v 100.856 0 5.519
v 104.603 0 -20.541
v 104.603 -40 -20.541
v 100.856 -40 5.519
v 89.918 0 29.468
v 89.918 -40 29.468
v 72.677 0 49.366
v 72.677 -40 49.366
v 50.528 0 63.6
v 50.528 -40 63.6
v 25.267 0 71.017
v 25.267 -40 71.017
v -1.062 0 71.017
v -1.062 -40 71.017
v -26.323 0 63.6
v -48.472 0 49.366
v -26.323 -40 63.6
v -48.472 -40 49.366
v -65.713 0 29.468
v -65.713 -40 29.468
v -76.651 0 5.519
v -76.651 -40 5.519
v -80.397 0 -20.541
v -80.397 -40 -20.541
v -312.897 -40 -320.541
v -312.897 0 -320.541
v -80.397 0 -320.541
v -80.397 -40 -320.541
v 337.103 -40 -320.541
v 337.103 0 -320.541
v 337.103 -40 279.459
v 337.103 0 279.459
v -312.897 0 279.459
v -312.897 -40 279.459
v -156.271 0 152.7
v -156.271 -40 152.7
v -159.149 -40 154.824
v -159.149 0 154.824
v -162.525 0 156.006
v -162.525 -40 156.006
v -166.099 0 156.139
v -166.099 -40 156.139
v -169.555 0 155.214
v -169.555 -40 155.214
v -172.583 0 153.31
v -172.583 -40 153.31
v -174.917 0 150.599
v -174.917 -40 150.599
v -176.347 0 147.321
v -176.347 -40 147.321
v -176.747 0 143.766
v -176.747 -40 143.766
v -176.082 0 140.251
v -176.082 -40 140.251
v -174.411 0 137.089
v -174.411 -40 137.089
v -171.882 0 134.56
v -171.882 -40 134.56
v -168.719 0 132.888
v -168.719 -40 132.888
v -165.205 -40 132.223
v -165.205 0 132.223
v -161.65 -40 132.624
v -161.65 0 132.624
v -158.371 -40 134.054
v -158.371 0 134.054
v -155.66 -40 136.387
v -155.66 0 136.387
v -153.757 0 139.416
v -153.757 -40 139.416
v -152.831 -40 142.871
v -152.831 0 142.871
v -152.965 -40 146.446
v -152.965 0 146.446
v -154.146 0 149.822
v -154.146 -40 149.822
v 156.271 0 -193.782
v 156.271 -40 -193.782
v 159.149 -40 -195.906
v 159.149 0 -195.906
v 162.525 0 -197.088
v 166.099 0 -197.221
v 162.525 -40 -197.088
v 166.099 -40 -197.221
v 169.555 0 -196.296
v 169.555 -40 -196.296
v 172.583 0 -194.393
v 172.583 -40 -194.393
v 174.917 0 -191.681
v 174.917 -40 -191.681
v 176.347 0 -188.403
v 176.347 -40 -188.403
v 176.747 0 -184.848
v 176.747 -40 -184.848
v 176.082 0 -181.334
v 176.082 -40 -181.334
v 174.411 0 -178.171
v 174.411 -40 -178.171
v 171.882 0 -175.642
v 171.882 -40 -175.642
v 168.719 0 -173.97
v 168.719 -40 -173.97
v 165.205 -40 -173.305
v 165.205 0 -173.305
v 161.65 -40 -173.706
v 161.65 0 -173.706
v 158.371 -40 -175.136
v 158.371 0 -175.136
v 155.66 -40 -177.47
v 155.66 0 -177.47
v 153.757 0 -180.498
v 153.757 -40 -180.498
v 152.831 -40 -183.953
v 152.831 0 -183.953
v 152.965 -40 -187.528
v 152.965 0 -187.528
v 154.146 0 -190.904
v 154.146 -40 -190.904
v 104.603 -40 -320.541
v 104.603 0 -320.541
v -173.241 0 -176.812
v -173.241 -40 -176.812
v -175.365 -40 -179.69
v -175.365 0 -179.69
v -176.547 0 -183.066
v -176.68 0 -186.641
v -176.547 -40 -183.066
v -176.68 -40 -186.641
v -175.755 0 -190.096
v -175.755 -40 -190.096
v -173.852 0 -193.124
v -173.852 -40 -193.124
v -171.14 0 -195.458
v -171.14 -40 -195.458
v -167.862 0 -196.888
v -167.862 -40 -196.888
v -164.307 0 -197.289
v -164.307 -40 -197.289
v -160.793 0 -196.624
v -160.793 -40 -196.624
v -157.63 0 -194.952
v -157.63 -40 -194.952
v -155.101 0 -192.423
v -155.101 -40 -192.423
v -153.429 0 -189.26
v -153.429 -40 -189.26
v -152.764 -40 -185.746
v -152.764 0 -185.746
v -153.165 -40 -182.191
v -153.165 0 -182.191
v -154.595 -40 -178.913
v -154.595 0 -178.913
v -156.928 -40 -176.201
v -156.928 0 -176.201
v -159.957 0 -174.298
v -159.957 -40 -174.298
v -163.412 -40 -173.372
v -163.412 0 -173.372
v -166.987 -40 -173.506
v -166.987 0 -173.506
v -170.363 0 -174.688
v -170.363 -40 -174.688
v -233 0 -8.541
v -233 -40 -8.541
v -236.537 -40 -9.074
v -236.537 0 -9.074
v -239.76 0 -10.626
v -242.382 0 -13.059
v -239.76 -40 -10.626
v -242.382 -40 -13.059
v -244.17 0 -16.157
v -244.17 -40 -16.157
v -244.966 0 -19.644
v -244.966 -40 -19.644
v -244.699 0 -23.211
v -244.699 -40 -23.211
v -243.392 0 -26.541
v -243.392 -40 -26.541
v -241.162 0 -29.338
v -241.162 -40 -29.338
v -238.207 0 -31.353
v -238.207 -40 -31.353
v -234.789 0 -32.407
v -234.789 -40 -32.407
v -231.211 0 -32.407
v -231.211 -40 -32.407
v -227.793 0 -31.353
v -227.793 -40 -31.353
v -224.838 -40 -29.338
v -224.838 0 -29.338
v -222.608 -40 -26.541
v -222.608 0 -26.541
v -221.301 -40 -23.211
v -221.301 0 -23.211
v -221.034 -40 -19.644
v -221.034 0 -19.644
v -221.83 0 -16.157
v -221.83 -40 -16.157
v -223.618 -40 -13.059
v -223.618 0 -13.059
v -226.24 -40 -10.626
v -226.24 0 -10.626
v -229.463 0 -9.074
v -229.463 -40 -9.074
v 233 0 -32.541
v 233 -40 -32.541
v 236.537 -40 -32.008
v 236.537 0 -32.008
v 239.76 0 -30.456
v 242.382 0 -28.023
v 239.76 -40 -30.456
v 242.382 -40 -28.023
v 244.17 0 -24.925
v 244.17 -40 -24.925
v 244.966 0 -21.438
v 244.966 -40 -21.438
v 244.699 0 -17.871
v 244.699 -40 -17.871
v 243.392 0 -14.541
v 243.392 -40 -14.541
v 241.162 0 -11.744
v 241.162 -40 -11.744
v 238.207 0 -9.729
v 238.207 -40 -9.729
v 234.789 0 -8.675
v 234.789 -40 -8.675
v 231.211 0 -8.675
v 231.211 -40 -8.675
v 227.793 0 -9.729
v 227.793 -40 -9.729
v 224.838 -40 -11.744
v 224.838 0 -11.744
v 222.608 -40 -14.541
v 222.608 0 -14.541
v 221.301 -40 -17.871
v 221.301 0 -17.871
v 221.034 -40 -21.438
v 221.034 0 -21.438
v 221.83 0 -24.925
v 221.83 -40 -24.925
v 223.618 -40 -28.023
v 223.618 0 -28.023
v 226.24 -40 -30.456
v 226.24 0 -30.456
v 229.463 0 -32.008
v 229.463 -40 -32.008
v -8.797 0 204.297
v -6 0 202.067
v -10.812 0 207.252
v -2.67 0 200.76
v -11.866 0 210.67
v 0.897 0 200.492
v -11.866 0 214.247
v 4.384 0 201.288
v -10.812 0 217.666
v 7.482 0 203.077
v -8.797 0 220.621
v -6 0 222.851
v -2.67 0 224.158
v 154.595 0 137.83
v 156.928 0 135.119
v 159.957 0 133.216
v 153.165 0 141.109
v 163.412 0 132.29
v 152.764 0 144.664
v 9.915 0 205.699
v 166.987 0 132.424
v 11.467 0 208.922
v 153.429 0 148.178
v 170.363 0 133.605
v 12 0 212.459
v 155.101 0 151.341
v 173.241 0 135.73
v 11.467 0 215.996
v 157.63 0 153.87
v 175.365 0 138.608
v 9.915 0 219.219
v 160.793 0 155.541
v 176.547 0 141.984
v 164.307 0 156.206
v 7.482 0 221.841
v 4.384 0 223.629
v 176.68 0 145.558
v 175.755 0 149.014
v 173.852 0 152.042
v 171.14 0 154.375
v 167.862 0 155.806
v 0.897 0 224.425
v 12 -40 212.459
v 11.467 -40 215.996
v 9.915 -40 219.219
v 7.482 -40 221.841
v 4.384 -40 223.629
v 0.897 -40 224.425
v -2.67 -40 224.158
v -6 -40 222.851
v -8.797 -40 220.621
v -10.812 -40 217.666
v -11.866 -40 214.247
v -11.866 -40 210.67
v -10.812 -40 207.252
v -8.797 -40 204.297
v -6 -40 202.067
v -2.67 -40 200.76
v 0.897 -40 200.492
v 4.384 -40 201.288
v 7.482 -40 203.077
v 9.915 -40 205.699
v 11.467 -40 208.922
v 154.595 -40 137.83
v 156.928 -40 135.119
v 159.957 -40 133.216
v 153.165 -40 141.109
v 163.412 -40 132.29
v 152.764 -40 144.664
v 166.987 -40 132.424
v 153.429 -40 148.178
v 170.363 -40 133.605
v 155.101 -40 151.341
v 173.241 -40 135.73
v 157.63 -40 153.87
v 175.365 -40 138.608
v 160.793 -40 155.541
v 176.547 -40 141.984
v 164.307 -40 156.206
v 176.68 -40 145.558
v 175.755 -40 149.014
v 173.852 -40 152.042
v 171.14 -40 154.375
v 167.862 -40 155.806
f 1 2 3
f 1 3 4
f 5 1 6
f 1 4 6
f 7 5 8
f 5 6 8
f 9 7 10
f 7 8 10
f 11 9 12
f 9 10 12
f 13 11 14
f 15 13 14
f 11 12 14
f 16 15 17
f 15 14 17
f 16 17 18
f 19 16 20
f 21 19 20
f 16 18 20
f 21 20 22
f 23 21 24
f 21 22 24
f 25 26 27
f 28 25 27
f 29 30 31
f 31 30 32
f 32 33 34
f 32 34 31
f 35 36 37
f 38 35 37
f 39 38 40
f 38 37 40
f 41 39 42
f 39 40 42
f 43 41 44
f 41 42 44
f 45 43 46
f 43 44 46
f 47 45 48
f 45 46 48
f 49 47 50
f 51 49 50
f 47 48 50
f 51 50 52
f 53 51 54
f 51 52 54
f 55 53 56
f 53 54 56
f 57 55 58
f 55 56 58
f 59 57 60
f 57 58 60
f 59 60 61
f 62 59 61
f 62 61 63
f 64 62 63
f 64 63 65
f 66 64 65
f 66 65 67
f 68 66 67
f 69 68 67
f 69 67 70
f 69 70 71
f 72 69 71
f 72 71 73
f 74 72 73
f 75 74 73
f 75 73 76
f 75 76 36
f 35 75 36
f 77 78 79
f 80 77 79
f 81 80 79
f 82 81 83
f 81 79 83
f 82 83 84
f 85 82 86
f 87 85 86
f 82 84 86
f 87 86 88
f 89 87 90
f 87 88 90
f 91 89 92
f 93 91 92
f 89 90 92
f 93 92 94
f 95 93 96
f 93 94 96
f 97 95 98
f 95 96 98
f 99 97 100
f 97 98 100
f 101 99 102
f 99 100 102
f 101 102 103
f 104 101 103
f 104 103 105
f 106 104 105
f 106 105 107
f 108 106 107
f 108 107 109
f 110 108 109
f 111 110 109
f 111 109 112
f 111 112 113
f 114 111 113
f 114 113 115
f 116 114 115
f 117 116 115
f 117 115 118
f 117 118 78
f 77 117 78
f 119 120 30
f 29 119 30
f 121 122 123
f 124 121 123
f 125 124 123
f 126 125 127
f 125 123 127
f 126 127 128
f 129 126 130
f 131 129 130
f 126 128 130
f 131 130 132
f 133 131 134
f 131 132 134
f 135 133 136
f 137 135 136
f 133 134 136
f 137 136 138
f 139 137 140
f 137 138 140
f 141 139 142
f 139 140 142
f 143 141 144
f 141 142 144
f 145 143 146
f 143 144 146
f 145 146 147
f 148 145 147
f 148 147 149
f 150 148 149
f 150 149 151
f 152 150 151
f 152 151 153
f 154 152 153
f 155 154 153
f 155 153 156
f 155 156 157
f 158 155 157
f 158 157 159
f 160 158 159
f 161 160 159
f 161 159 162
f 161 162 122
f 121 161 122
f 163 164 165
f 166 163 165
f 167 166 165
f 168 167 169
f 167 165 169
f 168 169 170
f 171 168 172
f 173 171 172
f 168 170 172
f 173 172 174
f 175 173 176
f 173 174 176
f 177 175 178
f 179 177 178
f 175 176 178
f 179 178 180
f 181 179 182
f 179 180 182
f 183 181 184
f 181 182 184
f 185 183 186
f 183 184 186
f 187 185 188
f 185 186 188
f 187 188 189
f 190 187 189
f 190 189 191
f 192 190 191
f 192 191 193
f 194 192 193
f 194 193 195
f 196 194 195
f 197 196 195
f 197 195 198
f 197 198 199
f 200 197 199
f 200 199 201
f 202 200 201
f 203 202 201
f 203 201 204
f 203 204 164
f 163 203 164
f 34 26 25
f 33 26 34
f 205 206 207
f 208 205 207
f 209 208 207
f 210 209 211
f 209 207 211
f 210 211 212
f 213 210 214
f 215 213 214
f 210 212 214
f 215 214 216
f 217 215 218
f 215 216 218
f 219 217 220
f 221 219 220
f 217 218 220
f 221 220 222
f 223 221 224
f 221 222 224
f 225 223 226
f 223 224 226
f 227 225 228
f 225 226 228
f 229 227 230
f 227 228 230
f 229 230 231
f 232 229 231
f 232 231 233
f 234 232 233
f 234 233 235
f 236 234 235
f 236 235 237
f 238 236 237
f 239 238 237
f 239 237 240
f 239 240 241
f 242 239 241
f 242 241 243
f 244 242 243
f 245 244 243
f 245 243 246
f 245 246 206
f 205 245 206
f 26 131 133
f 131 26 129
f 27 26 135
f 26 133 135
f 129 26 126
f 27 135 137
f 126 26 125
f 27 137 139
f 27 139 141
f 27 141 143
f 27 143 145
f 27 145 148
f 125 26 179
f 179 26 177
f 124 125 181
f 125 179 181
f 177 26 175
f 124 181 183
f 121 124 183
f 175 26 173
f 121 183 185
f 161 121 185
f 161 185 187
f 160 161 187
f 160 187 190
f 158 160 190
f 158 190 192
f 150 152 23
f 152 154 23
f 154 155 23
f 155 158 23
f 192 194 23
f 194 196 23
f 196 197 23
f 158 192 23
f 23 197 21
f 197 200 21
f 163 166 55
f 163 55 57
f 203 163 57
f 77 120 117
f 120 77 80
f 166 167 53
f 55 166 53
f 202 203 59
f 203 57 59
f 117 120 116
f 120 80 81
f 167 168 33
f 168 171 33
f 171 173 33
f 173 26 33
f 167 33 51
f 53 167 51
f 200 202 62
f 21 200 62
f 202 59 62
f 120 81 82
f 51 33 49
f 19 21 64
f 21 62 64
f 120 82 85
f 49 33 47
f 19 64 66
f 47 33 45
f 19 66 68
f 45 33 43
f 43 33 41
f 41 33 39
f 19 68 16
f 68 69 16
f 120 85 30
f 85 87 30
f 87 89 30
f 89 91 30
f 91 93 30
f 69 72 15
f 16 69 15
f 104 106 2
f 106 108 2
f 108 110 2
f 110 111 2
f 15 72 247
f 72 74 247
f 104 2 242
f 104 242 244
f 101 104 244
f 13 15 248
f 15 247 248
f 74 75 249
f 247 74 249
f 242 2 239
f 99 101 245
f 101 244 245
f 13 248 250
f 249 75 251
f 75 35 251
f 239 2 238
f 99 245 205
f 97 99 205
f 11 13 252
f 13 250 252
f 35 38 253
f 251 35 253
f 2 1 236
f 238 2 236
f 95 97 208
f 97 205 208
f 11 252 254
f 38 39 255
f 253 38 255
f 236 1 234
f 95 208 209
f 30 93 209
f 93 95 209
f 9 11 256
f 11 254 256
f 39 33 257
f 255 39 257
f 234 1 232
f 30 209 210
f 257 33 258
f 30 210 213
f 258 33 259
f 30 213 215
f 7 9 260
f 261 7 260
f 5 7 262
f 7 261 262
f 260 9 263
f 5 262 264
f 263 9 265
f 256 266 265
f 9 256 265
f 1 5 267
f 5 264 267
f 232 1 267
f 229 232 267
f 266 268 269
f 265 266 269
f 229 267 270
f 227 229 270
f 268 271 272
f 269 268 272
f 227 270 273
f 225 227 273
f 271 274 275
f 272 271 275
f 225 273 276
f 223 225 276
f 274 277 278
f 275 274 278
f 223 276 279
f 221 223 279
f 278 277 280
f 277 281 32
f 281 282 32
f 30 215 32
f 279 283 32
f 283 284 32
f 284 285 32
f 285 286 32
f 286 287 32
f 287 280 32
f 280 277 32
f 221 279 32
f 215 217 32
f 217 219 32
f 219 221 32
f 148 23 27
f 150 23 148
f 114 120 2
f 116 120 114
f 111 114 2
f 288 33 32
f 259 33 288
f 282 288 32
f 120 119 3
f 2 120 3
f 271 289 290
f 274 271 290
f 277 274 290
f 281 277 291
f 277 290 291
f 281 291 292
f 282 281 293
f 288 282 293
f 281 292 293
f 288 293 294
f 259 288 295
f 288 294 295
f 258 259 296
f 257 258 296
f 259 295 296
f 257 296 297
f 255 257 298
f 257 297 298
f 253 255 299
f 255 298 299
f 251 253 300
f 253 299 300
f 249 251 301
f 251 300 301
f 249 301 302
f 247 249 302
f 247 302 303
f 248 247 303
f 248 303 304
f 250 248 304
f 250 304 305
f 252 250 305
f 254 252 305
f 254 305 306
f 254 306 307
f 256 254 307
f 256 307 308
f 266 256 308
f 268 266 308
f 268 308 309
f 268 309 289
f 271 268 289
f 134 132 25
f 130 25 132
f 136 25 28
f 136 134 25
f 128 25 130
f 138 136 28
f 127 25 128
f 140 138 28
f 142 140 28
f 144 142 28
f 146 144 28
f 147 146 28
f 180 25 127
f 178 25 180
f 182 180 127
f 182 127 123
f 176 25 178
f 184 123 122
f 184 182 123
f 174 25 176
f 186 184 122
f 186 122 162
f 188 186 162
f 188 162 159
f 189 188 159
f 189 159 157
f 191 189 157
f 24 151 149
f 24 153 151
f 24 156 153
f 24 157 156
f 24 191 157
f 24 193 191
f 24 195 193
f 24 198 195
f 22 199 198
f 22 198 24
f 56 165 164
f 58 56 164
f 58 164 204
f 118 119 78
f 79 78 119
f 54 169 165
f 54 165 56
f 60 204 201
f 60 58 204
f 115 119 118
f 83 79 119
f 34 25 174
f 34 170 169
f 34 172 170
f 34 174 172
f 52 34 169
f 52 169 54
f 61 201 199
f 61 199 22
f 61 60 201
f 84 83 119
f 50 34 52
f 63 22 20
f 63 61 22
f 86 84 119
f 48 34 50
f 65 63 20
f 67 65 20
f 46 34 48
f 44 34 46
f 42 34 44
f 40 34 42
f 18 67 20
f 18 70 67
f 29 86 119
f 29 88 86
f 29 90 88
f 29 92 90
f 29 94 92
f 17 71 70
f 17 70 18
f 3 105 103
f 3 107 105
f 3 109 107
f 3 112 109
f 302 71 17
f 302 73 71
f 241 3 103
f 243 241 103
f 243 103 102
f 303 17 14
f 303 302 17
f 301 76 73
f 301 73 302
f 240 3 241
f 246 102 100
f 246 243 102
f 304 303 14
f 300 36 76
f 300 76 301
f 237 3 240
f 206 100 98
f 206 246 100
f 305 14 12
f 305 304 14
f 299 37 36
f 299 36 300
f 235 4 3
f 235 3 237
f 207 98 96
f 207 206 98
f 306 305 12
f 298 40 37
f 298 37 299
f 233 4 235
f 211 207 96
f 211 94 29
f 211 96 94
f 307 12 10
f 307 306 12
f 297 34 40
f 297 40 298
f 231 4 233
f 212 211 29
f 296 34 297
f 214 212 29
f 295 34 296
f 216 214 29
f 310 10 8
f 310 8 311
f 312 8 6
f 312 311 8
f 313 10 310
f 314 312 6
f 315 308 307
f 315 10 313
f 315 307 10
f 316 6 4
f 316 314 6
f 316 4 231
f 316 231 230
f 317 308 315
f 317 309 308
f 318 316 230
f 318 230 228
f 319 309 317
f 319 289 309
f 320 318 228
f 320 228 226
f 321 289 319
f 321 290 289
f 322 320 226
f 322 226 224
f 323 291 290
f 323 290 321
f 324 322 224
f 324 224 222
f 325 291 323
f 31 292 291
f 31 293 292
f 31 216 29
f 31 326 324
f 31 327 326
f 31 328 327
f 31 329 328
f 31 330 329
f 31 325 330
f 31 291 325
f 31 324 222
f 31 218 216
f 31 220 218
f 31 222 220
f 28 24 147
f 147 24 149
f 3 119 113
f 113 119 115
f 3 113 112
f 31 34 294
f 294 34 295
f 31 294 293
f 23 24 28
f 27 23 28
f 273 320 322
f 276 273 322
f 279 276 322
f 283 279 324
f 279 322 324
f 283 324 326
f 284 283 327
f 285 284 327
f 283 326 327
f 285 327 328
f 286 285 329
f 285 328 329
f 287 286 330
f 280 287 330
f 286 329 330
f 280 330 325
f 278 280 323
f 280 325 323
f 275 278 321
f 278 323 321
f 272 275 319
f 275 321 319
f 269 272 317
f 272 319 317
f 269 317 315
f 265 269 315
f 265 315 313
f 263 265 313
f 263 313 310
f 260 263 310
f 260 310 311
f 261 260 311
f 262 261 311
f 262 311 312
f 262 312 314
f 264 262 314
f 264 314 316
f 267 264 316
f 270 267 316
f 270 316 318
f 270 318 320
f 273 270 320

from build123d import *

# Parameters (mm, degrees)
F0_W             = 650
F0_H             = 600
F1_DEPTH         = 40
F3_DEPTH         = 40.001
F4_R             = 12
F5_DEPTH         = 40.001
F5_COPIES_COUNT  = 4
F5_COPIES_ANGLE  = 135
F5_COPIES1_COUNT = 4
F5_COPIES1_ANGLE = 135


# Not quite as in the source:
# - a pattern or mirror of a feature is missing from the dataset's text; its kind, count and spacing are read off the source's solid


with BuildPart() as f1:
    # F0 (on Front) → F1 (new body)
    with BuildSketch(Plane.XZ):
        with Locations((12.1025014669, -20.5410706814)):
            Rectangle(F0_W, F0_H)
    extrude(amount=F1_DEPTH)

    # F2 (on face) → F3 (cut, through all)
    with BuildSketch(Plane.XZ.offset(40)):
        with BuildLine():
            Line((-80.3974985331, -20.5410706814), (-80.3974985331, -320.5410706814))
            Line((-80.3974985331, -320.5410706814), (104.6025014669, -320.5410706814))
            Line((104.6025014669, -320.5410706814), (104.6025014669, -20.5410706814))
            ThreePointArc((104.6025014669, -20.5410706814), (12.1025014669, 71.9589293186), (-80.3974985331, -20.5410706814))
        make_face()
    extrude(amount=-F3_DEPTH, mode=Mode.SUBTRACT)

    # F4 (on face) → F5 (cut, through all)
    with BuildSketch(Plane.XZ.offset(40)):
        with Locations((0, 212.4589293186)):
            Circle(F4_R)
    f5 = extrude(amount=-F5_DEPTH, mode=Mode.SUBTRACT)

    # F5_copies: F5 ×4 about axis
    f5_copies_axis = Axis((0, 0, -20.541071), (0, 1, 0))
    for i in range(1, F5_COPIES_COUNT):
        add(f5.rotate(f5_copies_axis, i * F5_COPIES_ANGLE / (F5_COPIES_COUNT - 1)), mode=Mode.SUBTRACT)

    # F5_copies1: F5 ×4 about axis
    f5_copies1_axis = Axis((0, 0, -20.541071), (0, -1, 0))
    for i in range(1, F5_COPIES1_COUNT):
        add(f5.rotate(f5_copies1_axis, i * F5_COPIES1_ANGLE / (F5_COPIES1_COUNT - 1)), mode=Mode.SUBTRACT)


solid = f1.part
